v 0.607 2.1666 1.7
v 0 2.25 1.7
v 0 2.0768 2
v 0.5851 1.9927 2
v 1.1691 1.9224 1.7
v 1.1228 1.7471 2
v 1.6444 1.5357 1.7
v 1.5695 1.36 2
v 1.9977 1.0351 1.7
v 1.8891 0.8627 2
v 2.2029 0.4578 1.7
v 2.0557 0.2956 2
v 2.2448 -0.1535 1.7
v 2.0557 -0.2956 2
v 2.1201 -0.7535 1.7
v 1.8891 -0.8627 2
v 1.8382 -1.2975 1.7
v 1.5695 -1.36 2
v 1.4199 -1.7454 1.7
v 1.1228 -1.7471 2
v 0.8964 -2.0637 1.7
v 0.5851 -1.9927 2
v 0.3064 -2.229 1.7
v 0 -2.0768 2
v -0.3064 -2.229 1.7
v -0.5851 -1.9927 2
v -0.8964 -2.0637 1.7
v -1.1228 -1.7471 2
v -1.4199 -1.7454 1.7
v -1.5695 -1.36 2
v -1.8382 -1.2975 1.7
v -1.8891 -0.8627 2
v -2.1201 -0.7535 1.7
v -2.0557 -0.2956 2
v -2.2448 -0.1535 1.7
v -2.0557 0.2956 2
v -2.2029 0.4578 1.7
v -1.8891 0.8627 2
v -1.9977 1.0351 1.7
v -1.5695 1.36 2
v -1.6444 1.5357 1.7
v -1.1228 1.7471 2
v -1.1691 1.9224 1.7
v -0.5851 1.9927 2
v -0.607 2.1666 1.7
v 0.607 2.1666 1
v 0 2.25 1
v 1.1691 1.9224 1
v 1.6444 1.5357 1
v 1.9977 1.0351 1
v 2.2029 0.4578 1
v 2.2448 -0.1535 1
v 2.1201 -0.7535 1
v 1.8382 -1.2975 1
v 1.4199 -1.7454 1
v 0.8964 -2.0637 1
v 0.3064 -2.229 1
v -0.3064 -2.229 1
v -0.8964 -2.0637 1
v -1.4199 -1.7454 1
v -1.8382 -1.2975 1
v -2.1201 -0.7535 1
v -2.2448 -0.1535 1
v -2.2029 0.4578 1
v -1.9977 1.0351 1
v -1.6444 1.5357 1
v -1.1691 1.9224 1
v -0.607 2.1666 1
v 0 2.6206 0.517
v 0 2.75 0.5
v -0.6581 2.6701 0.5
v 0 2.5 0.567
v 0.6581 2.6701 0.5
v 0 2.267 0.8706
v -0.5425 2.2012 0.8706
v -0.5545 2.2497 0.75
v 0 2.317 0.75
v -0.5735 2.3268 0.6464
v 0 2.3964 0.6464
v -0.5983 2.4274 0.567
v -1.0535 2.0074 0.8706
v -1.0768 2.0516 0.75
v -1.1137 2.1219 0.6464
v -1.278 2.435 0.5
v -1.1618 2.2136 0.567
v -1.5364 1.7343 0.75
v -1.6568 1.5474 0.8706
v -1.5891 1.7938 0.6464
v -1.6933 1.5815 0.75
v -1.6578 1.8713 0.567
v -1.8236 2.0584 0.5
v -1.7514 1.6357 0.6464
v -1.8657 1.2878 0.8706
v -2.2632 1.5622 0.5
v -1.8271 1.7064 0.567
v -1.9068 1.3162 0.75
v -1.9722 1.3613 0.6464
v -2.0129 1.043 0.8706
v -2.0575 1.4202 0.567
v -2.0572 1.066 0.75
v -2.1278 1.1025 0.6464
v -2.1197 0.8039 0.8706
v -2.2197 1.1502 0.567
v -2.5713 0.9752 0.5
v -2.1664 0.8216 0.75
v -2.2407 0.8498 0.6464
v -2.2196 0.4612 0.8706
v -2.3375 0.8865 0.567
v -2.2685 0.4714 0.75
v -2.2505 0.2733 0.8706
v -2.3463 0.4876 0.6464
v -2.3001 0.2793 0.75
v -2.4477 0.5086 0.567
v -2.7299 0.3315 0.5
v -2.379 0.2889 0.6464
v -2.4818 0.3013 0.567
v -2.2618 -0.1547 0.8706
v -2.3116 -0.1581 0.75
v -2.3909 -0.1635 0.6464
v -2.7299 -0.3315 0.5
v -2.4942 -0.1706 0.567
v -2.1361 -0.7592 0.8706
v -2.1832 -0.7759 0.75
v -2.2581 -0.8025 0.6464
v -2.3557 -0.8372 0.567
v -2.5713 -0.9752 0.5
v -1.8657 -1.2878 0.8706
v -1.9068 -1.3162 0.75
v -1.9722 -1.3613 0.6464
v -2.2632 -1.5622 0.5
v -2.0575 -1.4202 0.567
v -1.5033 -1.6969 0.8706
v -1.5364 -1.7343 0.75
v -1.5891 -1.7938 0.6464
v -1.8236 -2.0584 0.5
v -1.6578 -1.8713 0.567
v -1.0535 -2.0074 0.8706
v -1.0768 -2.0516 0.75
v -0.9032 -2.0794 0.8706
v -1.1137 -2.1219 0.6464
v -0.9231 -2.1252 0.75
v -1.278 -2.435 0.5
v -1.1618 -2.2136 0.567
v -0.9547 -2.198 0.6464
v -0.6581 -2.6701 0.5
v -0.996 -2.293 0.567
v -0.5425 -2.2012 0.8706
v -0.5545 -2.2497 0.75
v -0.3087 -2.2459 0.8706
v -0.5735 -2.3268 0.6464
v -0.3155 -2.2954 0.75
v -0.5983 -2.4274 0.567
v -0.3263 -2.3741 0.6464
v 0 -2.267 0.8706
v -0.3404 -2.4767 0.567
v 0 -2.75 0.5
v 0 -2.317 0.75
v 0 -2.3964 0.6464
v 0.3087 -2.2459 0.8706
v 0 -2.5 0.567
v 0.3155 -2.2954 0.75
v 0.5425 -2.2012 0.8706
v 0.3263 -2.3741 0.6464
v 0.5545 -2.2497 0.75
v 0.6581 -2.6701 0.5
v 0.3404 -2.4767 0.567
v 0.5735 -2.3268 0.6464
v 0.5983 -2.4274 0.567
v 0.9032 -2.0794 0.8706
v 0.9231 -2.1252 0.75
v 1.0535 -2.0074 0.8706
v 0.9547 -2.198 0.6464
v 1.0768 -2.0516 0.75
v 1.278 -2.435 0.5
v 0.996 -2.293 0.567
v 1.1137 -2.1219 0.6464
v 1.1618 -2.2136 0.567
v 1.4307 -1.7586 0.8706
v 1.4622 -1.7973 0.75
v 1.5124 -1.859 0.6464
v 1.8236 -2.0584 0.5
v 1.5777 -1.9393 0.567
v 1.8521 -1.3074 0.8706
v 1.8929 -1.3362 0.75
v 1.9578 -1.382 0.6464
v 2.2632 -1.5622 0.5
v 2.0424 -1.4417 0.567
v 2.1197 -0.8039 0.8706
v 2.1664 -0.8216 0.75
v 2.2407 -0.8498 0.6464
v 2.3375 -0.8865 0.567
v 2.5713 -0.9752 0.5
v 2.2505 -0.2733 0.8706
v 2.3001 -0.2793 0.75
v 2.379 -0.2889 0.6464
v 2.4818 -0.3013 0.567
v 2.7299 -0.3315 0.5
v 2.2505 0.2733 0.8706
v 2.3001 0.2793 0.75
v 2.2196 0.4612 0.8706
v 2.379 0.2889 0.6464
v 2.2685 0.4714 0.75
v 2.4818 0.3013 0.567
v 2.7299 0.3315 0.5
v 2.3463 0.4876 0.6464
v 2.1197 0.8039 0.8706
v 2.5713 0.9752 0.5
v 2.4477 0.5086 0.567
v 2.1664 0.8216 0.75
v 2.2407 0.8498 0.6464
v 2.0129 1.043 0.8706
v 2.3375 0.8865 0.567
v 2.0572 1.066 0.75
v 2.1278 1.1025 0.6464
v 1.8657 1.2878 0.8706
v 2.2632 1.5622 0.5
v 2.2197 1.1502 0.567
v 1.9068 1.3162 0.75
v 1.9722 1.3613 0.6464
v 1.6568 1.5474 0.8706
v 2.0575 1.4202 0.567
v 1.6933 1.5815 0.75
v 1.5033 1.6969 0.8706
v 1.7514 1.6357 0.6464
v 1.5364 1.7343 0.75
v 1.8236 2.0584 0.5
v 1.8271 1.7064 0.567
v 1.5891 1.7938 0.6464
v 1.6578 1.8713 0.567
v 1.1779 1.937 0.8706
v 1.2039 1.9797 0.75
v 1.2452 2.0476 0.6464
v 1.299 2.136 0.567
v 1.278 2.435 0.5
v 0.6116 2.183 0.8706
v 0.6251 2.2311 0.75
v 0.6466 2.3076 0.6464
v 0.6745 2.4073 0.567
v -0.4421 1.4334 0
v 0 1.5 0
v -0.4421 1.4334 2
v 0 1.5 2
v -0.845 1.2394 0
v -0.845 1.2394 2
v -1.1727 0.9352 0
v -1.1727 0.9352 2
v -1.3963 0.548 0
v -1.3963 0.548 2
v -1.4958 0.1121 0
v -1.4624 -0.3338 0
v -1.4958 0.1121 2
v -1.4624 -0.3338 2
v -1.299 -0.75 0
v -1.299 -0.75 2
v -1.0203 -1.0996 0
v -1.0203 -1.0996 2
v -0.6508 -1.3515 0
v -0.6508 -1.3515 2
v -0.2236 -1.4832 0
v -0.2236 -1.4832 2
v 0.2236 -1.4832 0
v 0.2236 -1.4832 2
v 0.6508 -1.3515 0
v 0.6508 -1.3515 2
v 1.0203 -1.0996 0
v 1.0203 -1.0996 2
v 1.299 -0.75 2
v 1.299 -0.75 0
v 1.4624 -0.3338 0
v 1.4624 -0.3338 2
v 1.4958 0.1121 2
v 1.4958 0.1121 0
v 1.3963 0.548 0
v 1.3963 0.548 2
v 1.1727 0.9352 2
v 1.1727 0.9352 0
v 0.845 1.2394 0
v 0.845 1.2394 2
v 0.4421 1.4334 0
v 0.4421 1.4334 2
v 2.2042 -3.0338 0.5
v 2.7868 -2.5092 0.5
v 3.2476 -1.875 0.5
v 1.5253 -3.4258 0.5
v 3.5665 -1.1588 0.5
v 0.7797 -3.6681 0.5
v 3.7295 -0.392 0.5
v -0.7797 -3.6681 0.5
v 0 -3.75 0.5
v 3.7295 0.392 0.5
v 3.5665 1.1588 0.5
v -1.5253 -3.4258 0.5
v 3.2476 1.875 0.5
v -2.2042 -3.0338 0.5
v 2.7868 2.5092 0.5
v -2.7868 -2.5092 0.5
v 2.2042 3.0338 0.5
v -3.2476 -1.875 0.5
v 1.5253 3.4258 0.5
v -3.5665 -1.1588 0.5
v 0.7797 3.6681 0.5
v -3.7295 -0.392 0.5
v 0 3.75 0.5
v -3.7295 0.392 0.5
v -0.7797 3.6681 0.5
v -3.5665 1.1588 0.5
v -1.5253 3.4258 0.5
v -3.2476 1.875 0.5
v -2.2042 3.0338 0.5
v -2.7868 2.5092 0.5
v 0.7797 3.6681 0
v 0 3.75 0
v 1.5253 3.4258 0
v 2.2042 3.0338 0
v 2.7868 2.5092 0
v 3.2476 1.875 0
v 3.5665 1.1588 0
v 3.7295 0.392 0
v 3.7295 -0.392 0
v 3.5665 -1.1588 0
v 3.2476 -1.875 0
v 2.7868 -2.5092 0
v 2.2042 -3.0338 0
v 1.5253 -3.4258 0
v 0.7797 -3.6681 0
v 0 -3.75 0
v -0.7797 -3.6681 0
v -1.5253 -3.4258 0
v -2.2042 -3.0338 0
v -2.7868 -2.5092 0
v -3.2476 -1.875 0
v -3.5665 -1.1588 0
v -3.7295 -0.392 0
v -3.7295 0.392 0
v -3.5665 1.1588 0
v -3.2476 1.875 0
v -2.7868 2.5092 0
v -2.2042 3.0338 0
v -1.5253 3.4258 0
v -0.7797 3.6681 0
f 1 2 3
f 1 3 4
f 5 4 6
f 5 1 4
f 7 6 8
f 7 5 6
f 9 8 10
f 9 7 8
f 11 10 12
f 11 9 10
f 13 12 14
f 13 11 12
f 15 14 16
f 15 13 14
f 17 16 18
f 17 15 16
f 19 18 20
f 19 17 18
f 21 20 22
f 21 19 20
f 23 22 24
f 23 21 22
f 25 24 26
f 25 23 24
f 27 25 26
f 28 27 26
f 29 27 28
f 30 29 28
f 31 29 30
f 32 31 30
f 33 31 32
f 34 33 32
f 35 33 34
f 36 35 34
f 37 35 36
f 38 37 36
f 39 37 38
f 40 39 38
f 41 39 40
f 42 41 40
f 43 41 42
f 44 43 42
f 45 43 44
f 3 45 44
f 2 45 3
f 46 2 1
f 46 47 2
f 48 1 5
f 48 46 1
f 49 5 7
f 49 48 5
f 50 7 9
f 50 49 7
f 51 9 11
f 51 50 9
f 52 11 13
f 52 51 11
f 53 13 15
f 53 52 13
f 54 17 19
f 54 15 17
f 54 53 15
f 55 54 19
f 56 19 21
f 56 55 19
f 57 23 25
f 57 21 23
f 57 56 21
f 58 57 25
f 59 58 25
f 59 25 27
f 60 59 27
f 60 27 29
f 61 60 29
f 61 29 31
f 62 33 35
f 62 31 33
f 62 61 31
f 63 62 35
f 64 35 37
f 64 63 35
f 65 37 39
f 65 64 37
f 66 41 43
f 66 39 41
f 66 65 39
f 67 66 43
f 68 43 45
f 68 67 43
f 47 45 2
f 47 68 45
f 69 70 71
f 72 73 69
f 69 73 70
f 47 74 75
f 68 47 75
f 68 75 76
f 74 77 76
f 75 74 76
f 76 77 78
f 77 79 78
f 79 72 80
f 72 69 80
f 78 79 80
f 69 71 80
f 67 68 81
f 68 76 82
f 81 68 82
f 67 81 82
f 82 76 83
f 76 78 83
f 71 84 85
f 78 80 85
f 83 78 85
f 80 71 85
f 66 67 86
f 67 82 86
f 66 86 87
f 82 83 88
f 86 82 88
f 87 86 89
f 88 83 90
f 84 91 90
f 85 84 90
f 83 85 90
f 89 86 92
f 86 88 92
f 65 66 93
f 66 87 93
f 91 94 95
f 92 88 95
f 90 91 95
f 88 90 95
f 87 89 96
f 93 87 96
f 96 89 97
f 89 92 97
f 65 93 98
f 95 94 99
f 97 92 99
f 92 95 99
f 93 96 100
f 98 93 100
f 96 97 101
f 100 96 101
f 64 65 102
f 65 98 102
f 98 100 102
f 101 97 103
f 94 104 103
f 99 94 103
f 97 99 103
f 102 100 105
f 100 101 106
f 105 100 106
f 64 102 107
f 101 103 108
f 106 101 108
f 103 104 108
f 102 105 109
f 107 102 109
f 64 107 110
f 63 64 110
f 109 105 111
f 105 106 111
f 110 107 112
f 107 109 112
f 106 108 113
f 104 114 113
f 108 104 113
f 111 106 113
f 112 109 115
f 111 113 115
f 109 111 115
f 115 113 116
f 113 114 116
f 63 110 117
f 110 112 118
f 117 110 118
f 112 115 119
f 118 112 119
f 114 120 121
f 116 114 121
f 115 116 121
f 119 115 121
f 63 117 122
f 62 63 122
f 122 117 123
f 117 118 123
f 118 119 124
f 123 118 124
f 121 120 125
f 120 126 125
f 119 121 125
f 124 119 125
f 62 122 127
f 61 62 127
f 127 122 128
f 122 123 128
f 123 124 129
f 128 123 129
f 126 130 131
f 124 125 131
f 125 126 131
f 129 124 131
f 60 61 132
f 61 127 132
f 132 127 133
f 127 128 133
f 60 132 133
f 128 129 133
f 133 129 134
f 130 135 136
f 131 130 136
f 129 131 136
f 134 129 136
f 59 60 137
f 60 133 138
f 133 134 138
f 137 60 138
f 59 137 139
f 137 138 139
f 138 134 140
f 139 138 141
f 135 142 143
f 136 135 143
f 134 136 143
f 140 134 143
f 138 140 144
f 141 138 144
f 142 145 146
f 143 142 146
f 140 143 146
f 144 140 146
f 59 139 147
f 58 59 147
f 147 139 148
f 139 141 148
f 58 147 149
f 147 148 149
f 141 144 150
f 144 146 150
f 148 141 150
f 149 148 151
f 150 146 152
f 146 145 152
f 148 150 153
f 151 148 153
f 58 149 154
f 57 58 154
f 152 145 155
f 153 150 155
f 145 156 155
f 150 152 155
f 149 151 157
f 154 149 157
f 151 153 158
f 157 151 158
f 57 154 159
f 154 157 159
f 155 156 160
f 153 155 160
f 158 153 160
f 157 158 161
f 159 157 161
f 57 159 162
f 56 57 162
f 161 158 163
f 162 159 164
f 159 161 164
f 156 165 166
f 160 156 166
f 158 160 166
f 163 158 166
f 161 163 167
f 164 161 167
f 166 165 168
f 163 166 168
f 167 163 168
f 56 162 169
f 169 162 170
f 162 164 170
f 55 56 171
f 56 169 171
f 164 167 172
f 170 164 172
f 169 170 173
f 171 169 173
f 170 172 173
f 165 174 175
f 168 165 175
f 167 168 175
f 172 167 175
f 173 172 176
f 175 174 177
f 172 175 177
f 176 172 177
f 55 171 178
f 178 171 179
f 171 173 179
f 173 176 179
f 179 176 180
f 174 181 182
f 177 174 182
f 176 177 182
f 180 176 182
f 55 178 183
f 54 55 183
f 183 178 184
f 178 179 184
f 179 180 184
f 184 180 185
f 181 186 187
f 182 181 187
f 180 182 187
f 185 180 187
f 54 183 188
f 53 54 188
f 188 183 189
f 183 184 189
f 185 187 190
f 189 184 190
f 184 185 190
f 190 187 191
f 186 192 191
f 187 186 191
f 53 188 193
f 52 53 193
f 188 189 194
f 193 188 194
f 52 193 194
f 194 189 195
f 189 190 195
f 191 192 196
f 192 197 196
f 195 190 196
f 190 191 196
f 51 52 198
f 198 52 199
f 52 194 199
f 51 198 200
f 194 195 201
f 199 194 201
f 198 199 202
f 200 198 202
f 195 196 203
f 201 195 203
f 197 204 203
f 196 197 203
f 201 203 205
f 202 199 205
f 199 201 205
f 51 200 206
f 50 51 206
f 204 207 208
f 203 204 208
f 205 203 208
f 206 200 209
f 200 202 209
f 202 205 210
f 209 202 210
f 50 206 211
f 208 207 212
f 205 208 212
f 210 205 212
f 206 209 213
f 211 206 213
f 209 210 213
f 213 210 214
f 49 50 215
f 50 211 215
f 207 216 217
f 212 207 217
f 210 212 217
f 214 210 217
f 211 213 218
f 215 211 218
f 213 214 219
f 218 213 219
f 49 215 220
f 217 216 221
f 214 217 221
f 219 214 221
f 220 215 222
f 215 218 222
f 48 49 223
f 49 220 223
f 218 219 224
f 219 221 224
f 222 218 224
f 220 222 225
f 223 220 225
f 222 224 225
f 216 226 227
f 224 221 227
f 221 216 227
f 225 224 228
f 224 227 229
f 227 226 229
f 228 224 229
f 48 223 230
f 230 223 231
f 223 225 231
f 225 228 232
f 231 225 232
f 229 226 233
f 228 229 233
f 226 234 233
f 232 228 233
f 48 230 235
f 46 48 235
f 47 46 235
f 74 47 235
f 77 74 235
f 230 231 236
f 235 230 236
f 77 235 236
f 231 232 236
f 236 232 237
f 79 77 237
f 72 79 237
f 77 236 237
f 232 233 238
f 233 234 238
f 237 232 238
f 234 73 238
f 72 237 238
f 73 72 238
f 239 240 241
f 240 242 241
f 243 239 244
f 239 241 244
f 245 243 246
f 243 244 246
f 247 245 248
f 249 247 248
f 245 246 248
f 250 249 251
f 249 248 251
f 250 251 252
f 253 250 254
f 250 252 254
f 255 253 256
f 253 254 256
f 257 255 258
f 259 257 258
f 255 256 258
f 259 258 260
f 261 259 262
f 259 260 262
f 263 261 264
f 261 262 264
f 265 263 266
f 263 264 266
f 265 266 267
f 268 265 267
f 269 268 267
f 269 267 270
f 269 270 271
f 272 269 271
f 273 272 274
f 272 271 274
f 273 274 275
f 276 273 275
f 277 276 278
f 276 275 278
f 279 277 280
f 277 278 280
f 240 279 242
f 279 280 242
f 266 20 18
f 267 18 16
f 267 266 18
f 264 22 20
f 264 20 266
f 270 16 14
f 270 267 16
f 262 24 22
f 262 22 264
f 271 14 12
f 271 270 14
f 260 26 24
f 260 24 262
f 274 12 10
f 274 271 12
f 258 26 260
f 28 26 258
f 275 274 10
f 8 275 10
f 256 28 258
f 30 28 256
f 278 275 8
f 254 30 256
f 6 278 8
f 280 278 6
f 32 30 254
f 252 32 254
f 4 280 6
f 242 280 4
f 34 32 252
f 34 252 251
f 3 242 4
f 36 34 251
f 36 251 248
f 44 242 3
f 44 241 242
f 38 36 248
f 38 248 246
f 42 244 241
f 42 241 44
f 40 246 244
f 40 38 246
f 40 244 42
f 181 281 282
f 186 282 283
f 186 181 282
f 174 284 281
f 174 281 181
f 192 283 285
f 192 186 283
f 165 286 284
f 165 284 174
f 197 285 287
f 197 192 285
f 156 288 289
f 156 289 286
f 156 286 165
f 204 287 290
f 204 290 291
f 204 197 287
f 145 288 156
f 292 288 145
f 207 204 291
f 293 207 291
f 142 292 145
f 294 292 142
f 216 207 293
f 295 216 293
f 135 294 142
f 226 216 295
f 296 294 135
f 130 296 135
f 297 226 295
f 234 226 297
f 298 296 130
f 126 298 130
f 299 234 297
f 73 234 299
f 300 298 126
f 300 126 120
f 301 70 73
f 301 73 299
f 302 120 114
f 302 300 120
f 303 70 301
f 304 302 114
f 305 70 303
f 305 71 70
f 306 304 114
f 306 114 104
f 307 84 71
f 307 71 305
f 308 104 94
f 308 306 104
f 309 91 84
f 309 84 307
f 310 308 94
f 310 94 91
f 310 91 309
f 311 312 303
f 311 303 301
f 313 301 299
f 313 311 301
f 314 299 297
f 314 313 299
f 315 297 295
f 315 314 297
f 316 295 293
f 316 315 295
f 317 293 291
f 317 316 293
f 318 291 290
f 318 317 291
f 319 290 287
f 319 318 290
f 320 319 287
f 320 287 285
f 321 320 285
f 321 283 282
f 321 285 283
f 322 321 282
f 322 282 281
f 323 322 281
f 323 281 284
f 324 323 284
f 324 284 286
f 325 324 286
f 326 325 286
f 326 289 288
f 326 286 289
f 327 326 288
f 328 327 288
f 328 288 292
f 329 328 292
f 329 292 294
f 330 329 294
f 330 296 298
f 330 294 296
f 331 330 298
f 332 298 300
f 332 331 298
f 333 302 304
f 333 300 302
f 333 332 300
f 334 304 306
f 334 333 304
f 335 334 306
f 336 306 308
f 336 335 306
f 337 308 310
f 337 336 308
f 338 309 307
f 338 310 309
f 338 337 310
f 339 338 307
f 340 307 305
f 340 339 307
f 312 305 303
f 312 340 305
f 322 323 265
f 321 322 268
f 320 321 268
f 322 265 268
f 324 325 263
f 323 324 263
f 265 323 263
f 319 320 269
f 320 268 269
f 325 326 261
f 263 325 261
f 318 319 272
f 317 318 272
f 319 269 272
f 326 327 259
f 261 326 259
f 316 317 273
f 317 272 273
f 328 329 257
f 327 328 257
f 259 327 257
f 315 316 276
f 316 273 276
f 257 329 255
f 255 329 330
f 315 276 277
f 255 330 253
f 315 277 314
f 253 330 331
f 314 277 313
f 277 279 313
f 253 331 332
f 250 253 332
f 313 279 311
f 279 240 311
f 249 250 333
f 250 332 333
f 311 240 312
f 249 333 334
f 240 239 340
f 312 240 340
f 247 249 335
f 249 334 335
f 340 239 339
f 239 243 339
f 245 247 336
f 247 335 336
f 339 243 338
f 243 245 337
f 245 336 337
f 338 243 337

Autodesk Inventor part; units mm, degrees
ref_plane "YZ Plane" through (0, 0, 0) normal (1, 0, 0) x (0, 1, 0)
ref_plane "XZ Plane" through (0, 0, 0) normal (0, 1, 0) x (-1, 0, 0)
ref_plane "XY Plane" through (0, 0, 0) normal (0, 0, 1) x (1, 0, 0)
sketch "スケッチ1" plane through (0, 0, 0) normal (1, 0, 0) x (0, 1, 0)
  line L0 (0, -0.4) -> (0, 2.4) construction
  line L1 (1.5, 2) -> (2.25, 2)
  line L2 (2.25, 2) -> (2.25, 0.5)
  line L3 (2.25, 0.5) -> (1.5, 0.5)
  line L4 (1.5, 0.5) -> (1.5, 2)
  line L5 (1.5, 0.5) -> (3.75, 0.5)
  line L6 (3.75, 0.5) -> (3.75, 0)
  line L7 (3.75, 0) -> (1.5, 0)
  line L8 (1.5, 0) -> (1.5, 0.5)
  point P0 (0, 0)
  point P1 (2.25, 0.5)
  dimension "d0" = 3
  dimension "d1" = 4.5
  dimension "d2" = 0.5
  dimension "d3" = 2
  dimension "d4" = 7.5
revolve "回転1" add sketch "スケッチ1" angle 360 about axis through (0, 0, -10) along (0, 0, 1)
fillet "フィレット1" radius 0.5 1 edges at (0, -2.25, 0.5)
chamfer "面取り1" distance 0.3 angle 30 1 edges at (0, -2.25, 2) measured on face at (0.181, 2.2427, 1.3333)
properties part number "_GFM-0608-04" material "アセタール樹脂、黒"
